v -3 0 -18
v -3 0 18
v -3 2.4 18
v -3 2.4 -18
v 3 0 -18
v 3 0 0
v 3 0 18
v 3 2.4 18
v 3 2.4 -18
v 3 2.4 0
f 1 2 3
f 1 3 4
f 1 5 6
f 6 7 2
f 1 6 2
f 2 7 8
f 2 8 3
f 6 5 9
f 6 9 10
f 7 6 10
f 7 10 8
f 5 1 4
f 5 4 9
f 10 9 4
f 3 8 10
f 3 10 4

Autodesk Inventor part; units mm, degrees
ref_plane "YZ Plane" through (0, 0, 0) normal (1, 0, 0) x (0, 1, 0)
ref_plane "XZ Plane" through (0, 0, 0) normal (0, 1, 0) x (-1, 0, 0)
ref_plane "XY Plane" through (0, 0, 0) normal (0, 0, 1) x (1, 0, 0)
sketch "Náčrt1" plane through (0, 0, 0) normal (0, 0, 1) x (1, 0, 0)
  point P0 (0, 0)
sketch "Náčrt2" plane through (0, 0, 0) normal (0, 1, 0) x (-1, 0, 0)
  line L0 (0, 0) -> (-3, 0)
  line L1 (-3, 0) -> (-3, 18) construction
  line L2 (-3, 18) -> (0, 18) construction
  line L3 (0, 18) -> (0, 0) construction
  line L4 (-3, 18) -> (3, 18)
  line L5 (3, 18) -> (3, -18)
  line L6 (3, -18) -> (-3, -18)
  line L7 (-3, -18) -> (-3, 18)
  dimension "d0" = 3
  dimension "d1" = 18
  dimension "d2" = 6
  dimension "d3" = 36
extrude "Vysunutí1" add sketch "Náčrt2" along normal blind 2.4
properties part number "ochrana li-ion baterie"
